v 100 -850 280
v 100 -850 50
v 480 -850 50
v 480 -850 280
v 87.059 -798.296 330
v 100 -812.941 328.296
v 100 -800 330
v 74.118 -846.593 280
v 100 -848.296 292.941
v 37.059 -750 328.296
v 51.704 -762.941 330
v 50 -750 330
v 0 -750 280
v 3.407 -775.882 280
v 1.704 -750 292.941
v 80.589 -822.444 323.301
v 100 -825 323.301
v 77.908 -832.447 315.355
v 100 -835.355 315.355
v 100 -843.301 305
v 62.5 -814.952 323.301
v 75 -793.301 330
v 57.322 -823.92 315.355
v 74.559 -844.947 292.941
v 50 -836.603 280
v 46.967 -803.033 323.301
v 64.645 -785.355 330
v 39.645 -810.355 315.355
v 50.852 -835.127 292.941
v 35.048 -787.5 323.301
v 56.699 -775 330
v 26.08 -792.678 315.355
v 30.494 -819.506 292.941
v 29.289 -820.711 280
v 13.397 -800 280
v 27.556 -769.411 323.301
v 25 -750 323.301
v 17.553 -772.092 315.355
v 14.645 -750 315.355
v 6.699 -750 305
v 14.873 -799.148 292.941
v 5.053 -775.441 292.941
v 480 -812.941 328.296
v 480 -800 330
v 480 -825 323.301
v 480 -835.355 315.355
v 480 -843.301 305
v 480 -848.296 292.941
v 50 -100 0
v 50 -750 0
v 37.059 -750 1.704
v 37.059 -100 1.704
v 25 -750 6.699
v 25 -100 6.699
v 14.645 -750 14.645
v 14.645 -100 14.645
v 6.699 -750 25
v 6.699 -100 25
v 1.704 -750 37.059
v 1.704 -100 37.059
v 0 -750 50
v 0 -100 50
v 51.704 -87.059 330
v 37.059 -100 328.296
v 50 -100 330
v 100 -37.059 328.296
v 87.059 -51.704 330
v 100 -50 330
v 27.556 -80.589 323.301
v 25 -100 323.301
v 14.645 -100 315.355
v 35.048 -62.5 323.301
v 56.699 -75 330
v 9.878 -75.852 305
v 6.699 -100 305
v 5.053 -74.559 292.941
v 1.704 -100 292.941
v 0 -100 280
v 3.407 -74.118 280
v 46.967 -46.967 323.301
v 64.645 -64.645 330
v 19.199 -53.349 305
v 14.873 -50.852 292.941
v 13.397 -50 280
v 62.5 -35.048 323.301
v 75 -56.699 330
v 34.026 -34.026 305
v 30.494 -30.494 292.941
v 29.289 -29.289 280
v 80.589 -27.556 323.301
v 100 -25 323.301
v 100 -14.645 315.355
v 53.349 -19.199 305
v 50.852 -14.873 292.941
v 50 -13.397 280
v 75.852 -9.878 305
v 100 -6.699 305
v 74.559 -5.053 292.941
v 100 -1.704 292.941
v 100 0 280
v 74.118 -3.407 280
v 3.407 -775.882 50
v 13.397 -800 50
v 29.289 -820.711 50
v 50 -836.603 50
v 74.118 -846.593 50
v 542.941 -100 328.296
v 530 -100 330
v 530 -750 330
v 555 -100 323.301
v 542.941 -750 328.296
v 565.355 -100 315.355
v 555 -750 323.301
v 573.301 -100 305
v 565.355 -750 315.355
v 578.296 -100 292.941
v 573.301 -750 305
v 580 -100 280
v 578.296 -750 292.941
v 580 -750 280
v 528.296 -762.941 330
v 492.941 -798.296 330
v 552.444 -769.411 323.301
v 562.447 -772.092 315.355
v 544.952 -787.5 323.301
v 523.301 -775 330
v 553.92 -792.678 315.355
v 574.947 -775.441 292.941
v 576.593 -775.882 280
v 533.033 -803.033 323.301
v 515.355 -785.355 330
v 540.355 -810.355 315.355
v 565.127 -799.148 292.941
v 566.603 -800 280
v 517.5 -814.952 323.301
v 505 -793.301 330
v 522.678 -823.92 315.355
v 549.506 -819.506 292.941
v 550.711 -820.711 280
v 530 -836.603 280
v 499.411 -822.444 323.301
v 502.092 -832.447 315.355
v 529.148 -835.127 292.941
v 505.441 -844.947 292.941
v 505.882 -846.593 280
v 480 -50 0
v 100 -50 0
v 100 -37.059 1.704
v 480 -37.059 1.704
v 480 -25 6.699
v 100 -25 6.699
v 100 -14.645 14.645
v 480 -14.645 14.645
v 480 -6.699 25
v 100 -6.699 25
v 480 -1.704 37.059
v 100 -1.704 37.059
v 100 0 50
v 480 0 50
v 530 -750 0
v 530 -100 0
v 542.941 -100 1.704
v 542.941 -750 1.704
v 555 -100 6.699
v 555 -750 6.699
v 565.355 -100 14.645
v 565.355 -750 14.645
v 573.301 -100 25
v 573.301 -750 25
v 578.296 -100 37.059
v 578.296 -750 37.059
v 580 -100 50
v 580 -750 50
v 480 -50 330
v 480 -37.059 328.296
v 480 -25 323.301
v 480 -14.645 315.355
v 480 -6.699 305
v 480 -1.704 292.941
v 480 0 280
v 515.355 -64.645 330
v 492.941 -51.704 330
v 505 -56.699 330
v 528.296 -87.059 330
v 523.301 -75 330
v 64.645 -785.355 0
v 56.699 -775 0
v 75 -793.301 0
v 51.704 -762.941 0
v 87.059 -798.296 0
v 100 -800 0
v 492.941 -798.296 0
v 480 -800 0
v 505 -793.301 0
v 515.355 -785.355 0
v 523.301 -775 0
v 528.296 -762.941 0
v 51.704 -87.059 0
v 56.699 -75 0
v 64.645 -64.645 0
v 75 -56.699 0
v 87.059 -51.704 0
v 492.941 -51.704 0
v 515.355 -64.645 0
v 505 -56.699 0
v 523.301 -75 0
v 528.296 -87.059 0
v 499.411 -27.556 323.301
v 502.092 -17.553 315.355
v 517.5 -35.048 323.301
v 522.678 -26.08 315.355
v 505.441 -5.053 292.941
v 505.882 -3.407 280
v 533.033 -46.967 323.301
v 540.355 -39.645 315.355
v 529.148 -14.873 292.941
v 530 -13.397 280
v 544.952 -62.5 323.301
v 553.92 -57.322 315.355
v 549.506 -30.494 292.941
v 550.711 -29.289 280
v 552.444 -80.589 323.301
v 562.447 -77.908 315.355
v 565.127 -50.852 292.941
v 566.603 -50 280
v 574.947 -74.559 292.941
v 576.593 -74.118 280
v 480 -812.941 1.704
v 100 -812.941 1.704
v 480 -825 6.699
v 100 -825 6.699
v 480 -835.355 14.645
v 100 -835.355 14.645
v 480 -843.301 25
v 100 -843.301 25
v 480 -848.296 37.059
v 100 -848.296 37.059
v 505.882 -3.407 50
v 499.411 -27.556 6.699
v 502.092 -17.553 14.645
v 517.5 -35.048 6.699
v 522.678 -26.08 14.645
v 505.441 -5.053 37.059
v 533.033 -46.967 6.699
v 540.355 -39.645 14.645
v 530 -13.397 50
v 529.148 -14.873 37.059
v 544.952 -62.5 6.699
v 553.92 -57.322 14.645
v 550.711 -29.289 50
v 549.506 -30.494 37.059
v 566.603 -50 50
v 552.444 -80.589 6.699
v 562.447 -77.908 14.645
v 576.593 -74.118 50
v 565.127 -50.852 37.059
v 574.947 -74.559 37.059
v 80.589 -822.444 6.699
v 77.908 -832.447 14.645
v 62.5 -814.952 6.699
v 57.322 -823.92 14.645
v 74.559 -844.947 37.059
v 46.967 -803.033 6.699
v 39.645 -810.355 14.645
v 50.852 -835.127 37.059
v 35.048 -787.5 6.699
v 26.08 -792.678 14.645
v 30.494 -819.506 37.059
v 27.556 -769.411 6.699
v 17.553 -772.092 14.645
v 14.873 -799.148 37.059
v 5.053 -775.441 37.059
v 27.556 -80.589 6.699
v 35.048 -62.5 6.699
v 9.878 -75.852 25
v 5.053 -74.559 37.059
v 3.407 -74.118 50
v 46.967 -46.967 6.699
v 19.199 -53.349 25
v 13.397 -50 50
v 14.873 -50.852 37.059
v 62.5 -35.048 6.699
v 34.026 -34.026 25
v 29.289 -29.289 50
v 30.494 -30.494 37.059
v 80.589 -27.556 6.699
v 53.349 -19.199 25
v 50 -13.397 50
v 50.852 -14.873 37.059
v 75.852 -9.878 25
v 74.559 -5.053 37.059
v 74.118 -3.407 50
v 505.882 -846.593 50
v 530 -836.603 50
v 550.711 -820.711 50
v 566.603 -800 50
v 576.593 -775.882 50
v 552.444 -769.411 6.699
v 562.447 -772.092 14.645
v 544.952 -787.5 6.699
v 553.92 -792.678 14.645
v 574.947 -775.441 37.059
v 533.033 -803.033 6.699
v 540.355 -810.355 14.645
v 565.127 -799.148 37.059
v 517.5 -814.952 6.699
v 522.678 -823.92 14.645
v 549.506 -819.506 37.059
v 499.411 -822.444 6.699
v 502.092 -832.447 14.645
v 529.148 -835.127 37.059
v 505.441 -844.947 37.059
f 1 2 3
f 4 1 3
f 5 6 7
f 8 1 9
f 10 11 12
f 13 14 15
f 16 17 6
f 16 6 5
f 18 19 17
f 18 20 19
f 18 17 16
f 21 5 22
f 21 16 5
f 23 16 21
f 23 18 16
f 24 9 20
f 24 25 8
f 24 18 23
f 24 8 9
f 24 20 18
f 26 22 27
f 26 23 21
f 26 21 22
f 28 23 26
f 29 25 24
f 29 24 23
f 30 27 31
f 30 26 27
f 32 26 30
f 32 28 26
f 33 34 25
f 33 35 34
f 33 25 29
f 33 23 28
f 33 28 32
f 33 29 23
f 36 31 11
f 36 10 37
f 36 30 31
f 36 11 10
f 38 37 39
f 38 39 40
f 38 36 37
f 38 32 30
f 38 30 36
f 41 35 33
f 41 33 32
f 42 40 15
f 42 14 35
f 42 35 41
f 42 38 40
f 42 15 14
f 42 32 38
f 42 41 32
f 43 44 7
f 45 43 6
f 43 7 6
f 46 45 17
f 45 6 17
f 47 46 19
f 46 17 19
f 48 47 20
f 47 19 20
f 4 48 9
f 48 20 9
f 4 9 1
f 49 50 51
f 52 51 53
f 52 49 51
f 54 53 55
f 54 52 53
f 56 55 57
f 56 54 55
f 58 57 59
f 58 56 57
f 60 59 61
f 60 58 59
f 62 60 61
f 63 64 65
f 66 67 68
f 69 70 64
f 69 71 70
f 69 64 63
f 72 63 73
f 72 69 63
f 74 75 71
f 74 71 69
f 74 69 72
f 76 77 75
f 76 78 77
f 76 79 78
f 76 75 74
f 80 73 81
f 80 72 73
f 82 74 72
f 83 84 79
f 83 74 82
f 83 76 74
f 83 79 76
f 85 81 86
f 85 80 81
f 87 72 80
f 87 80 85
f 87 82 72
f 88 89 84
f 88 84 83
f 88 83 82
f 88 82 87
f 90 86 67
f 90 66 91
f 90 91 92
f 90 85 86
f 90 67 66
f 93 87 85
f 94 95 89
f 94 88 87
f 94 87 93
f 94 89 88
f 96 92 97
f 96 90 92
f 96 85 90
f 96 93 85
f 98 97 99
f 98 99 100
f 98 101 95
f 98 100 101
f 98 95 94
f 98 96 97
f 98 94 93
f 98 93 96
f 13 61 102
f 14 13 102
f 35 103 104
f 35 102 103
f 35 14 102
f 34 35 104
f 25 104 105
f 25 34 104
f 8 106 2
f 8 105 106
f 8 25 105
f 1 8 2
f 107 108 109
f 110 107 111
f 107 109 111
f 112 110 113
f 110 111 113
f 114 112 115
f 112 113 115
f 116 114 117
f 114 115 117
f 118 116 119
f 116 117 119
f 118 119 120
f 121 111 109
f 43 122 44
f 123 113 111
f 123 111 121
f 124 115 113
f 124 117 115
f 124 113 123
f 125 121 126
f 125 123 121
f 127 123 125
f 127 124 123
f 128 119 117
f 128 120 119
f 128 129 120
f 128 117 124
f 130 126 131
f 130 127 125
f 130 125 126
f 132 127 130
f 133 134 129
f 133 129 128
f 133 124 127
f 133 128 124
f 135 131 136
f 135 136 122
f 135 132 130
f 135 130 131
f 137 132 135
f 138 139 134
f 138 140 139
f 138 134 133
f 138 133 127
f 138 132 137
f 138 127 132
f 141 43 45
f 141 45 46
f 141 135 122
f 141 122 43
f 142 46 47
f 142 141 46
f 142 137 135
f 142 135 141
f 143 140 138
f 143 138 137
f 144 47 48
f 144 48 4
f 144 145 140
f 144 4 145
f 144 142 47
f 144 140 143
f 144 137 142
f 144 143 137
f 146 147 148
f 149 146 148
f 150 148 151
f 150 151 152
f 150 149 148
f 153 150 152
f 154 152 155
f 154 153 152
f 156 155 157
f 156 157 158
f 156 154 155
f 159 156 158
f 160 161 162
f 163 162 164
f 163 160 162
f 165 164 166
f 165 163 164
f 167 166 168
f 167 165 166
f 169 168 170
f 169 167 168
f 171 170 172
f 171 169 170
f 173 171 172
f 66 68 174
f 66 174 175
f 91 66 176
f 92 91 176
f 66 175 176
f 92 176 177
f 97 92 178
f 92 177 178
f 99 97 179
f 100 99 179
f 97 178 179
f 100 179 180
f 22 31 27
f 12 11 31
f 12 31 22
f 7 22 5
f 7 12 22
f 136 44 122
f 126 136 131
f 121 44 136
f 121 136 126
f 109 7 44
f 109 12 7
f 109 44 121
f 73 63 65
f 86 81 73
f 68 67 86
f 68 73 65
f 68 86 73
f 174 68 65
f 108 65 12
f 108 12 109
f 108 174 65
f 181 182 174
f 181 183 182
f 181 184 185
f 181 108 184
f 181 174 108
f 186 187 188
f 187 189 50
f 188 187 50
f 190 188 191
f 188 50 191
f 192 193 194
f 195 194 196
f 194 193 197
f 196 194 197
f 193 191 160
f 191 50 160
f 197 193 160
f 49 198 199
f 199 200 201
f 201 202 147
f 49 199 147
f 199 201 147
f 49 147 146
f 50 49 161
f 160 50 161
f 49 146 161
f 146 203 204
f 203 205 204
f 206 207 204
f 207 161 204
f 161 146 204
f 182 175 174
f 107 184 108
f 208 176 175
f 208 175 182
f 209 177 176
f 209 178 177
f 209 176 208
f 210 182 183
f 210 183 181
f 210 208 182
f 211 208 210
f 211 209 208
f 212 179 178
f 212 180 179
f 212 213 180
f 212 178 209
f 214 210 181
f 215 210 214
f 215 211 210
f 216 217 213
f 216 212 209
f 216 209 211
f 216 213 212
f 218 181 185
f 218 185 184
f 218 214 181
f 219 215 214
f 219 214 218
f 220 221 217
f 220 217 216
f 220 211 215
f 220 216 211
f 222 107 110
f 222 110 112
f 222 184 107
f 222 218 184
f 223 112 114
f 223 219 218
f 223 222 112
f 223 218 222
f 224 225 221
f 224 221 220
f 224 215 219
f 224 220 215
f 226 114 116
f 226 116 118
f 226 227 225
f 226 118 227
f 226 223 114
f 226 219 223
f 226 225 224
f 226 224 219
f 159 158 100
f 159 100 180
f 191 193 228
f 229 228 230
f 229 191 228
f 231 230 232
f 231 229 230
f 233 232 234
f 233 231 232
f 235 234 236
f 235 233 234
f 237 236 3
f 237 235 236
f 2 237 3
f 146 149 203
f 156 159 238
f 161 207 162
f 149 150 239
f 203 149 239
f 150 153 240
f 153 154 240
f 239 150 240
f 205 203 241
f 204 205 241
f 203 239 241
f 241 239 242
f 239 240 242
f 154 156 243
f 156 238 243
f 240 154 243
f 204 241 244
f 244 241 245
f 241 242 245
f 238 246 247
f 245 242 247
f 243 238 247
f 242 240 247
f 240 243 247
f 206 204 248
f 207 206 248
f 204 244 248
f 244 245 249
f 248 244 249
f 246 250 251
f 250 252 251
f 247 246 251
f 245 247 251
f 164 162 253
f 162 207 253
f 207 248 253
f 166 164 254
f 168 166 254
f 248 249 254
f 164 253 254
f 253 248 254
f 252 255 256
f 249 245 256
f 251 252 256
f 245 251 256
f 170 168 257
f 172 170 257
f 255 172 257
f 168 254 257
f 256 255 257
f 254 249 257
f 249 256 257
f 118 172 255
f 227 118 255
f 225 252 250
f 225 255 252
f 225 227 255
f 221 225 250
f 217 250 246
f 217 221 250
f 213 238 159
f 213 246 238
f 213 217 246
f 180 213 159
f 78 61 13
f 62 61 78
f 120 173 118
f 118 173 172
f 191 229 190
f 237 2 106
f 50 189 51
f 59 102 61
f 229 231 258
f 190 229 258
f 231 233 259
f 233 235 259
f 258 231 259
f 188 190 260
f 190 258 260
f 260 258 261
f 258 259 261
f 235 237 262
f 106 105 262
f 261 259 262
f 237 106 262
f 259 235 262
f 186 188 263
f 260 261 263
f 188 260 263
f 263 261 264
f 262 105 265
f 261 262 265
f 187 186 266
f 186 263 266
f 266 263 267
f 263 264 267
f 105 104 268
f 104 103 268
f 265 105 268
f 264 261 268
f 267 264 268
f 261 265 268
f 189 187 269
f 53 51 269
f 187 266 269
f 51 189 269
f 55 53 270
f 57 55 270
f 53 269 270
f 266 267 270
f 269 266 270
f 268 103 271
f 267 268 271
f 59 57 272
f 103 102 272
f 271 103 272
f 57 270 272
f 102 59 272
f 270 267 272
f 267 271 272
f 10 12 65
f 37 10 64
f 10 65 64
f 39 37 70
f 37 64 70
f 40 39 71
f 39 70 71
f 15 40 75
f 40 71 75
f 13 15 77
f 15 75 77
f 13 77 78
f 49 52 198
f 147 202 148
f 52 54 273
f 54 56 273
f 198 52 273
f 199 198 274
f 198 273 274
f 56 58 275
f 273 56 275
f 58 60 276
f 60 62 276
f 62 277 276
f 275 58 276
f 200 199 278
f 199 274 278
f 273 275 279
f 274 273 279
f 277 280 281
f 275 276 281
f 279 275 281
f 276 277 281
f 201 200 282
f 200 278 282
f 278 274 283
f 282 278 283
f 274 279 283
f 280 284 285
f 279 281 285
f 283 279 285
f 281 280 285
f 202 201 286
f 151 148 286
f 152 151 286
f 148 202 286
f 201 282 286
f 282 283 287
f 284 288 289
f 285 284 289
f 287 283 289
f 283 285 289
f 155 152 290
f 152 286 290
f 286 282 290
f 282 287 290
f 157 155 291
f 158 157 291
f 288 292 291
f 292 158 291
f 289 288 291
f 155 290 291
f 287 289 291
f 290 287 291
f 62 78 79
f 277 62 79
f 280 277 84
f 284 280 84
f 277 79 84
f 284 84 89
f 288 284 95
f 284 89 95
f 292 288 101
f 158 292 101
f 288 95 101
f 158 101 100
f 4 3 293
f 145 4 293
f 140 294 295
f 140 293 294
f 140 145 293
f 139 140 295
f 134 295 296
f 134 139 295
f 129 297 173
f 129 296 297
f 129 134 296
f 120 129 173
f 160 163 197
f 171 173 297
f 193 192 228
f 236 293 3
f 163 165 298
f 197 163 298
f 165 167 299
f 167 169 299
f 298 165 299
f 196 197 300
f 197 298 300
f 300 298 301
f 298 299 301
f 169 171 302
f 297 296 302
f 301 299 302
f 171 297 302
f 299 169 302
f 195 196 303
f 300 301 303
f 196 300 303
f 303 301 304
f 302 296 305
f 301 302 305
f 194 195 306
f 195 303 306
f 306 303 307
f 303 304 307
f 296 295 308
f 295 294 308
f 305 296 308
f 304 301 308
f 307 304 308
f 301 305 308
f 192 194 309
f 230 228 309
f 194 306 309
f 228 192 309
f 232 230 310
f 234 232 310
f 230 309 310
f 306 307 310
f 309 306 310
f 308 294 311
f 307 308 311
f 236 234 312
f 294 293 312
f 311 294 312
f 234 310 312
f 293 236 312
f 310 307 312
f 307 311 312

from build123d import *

# Parameters (mm, degrees)
F0_W     = 580
F0_H     = 850
F1_DEPTH = 330
F2_R     = 100
F3_R     = 50


with BuildPart() as f1:
    # F0 (on Top) → F1 (new body)
    with BuildSketch(Plane.XY):
        with Locations((290, -425)):
            Rectangle(F0_W, F0_H)
    extrude(amount=F1_DEPTH)

    # F2
    f2_edges = [f1.edges().sort_by_distance(p)[0] for p in [
        (580, -850, 165),
        (580, 0, 165),
        (0, -850, 165),
        (0, 0, 165),
    ]]
    fillet(f2_edges, radius=F2_R)

    # F3
    f3_edges = [f1.edges().sort_by_distance(p)[0] for p in [
        (290, 0, 330),
        (550.710678, -29.289322, 330),
        (29.289322, -29.289322, 330),
        (580, -425, 330),
        (0, -425, 330),
        (550.710678, -820.710678, 330),
        (29.289322, -820.710678, 330),
        (290, -850, 330),
        (290, 0, 0),
        (550.710678, -29.289322, 0),
        (29.289322, -29.289322, 0),
        (580, -425, 0),
        (0, -425, 0),
        (550.710678, -820.710678, 0),
        (29.289322, -820.710678, 0),
        (290, -850, 0),
    ]]
    fillet(f3_edges, radius=F3_R)


solid = f1.part
